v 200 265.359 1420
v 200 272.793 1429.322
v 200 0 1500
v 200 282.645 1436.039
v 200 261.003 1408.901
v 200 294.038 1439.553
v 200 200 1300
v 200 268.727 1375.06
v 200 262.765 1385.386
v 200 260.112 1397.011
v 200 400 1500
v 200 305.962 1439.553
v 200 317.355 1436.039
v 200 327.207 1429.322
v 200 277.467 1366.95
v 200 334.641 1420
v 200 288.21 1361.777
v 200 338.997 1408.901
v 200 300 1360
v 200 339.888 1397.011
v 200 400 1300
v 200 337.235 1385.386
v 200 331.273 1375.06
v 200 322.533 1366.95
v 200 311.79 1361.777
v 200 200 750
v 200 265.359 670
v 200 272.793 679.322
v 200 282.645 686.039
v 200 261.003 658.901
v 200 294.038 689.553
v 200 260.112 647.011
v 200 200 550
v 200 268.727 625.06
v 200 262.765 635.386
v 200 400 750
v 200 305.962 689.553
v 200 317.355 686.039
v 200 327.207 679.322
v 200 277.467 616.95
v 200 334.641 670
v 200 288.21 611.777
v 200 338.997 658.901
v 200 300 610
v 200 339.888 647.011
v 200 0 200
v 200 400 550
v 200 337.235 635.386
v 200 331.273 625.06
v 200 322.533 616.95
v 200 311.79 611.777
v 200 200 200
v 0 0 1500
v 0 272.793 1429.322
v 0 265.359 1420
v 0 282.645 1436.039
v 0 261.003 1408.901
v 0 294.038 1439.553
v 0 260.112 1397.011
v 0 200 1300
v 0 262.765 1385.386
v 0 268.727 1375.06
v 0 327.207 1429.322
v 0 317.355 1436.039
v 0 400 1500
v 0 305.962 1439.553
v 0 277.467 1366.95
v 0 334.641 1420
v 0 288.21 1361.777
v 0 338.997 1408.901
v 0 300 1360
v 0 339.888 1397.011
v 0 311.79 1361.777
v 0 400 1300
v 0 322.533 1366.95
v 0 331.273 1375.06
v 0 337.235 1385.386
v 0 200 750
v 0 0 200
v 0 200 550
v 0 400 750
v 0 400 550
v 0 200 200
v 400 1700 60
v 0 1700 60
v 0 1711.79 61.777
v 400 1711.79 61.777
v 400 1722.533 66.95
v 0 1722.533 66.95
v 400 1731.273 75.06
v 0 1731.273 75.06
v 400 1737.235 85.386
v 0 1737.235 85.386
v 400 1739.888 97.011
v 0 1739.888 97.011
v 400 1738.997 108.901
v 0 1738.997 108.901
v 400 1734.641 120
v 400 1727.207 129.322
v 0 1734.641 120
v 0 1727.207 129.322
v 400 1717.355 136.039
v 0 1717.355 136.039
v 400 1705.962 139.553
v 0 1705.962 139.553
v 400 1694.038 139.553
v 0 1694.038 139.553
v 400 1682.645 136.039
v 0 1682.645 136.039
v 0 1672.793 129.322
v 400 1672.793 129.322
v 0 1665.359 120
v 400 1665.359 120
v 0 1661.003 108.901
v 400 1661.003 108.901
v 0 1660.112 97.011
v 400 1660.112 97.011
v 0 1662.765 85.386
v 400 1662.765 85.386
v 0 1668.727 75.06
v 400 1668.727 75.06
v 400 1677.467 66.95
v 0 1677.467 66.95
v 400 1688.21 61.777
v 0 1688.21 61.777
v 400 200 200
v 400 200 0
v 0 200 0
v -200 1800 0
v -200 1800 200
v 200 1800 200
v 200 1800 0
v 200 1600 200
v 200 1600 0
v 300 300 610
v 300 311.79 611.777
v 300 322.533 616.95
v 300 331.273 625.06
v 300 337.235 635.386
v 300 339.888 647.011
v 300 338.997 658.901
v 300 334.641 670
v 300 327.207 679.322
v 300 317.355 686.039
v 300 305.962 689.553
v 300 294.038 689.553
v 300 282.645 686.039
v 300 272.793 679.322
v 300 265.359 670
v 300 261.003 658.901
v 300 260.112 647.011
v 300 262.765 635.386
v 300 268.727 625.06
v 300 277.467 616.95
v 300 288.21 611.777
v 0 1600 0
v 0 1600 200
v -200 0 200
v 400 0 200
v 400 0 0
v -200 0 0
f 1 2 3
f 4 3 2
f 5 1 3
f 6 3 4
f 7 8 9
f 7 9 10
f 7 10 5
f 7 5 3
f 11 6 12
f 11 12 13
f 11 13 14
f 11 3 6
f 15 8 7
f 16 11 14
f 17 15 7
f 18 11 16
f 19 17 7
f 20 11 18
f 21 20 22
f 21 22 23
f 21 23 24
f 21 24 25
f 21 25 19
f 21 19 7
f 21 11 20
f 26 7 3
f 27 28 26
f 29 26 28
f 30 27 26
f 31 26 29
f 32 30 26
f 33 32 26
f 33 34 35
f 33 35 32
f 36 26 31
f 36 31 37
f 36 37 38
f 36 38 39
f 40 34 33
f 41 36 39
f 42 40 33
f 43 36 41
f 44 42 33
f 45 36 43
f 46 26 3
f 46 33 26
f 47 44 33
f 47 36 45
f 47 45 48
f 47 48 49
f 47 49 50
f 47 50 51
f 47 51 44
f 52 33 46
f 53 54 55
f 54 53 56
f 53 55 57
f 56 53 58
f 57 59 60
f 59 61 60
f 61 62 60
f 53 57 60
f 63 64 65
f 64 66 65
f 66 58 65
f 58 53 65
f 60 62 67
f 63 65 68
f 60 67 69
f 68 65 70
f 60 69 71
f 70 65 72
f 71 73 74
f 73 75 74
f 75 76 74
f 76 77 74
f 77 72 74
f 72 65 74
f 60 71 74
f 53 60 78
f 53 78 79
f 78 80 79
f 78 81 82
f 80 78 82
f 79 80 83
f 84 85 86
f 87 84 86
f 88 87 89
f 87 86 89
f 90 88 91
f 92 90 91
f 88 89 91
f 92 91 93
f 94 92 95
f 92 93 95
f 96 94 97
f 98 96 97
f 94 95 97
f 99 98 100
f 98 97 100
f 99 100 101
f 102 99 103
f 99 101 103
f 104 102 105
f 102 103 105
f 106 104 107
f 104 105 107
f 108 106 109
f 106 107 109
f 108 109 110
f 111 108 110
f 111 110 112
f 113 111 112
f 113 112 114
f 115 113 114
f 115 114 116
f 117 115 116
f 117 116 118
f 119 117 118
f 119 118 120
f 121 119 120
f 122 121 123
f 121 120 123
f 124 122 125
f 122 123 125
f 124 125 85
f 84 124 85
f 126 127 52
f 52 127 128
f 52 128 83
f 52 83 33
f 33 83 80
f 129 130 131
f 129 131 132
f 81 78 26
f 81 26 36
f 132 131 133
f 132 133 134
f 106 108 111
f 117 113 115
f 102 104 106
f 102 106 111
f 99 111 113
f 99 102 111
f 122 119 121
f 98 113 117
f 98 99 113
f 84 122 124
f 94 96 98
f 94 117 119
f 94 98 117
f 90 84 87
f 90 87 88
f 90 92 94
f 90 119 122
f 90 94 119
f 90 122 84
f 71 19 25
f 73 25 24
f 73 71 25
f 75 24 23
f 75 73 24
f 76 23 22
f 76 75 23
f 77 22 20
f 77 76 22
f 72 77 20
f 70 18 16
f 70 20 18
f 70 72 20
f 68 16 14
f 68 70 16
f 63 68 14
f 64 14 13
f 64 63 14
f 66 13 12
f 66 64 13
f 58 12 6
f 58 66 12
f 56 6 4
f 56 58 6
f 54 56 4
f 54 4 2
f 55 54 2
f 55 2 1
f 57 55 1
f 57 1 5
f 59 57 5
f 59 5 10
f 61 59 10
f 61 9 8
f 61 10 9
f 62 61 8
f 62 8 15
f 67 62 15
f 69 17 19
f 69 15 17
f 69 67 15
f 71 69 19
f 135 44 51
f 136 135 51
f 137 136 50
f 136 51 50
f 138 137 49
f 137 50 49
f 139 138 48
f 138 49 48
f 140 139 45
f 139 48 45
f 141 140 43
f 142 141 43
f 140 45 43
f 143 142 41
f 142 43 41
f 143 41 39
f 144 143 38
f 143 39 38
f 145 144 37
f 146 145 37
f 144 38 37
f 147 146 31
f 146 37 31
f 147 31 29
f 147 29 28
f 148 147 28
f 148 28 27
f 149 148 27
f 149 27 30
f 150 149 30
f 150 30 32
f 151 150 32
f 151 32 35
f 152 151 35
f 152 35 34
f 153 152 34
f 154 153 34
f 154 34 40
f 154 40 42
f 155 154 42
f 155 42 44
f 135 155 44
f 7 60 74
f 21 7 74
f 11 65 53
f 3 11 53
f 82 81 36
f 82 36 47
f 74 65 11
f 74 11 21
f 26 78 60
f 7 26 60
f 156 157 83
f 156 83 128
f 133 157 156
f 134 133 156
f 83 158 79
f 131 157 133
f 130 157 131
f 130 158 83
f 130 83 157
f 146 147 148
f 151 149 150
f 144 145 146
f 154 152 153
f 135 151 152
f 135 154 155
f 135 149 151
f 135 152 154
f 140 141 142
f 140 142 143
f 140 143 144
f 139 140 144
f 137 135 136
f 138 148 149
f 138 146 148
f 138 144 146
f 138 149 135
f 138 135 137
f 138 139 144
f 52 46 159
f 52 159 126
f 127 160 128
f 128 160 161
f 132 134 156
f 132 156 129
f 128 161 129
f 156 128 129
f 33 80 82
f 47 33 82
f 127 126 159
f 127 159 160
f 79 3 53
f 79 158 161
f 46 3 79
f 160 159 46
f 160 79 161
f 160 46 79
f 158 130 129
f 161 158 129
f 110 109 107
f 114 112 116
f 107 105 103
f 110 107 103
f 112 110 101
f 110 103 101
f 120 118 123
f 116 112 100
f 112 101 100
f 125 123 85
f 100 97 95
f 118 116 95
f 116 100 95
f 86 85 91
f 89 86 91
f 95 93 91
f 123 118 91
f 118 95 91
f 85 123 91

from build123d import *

# Parameters (mm, degrees)
LOWERBASE_W             = 200
LOWERBASE_H             = 200
BOSS_EXTRUDE1_DEPTH     = 200
UPPERBASE_W             = 200
UPPERBASE_H             = 1800
BOSS_EXTRUDE2_DEPTH     = 200
TOPPIVOT_W              = 200
TOPPIVOT_H              = 200
BOSS_EXTRUDE3_DEPTH     = 200
PRESSTABLE_W            = 200
PRESSTABLE_H            = 200
BOSS_EXTRUDE4_DEPTH     = 400
MIDDLERIVET_R           = 40
BOSS_EXTRUDE5_DEPTH     = 300
TOPRIVET_R              = 40
BOSS_EXTRUDE6_DEPTH     = 400
SKETCH6_R               = 40
CUT_EXTRUDE1_DEPTH      = 401
CUT_EXTRUDE1_DEPTH_BACK = 201


with BuildPart() as part:
    # LowerBase → Boss-Extrude1 (new body)
    with BuildSketch(Plane(origin=(0, 0, 0), x_dir=(0, 0, -1), z_dir=(1, 0, 0))):
        Polygon((-1500, 0), (0, 0), (0, 200), (-550, 200), (-750, 200), (-1300, 200), (-1500, 200), align=None)
        with Locations((-1400, 300)):
            Rectangle(LOWERBASE_W, LOWERBASE_H)
        with Locations((-650, 300)):
            Rectangle(LOWERBASE_W, LOWERBASE_H)
    extrude(amount=BOSS_EXTRUDE1_DEPTH)

    # UpperBase → Boss-Extrude2 (add)
    with BuildSketch(Plane(origin=(0, 0, 0), x_dir=(0, 0, -1), z_dir=(1, 0, 0))):
        with Locations((-100, 900)):
            Rectangle(UPPERBASE_W, UPPERBASE_H)
    extrude(amount=-BOSS_EXTRUDE2_DEPTH)

    # TopPivot → Boss-Extrude3 (add)
    with BuildSketch(Plane(origin=(0, 0, 0), x_dir=(0, 0, -1), z_dir=(1, 0, 0))):
        with Locations((-100, 1700)):
            Rectangle(TOPPIVOT_W, TOPPIVOT_H)
    extrude(amount=BOSS_EXTRUDE3_DEPTH)

    # PressTable → Boss-Extrude4 (add)
    with BuildSketch(Plane(origin=(0, 0, 0), x_dir=(0, 0, -1), z_dir=(1, 0, 0))):
        with Locations((-100, 100)):
            Rectangle(PRESSTABLE_W, PRESSTABLE_H)
    extrude(amount=BOSS_EXTRUDE4_DEPTH)

    # MiddleRivet → Boss-Extrude5 (add)
    with BuildSketch(Plane(origin=(0, 0, 0), x_dir=(0, 0, -1), z_dir=(1, 0, 0))):
        with Locations((-650, 300)):
            Circle(MIDDLERIVET_R)
    extrude(amount=BOSS_EXTRUDE5_DEPTH)

    # Sketch6 → Cut-Extrude1 (cut, two sides)
    with BuildSketch(Plane(origin=(0, 0, 0), x_dir=(0, 0, -1), z_dir=(1, 0, 0))) as cut_extrude1_sk:
        with Locations((-1400, 300)):
            Circle(SKETCH6_R)
    extrude(amount=CUT_EXTRUDE1_DEPTH, mode=Mode.SUBTRACT)
    extrude(cut_extrude1_sk.sketch, amount=-CUT_EXTRUDE1_DEPTH_BACK, mode=Mode.SUBTRACT)


with BuildPart() as body_2:
    # TopRivet → Boss-Extrude6 (new body)
    with BuildSketch(Plane(origin=(0, 0, 0), x_dir=(0, 0, -1), z_dir=(1, 0, 0))):
        with Locations((-100, 1700)):
            Circle(TOPRIVET_R)
    extrude(amount=BOSS_EXTRUDE6_DEPTH)


solid = Compound([part.part, body_2.part])
